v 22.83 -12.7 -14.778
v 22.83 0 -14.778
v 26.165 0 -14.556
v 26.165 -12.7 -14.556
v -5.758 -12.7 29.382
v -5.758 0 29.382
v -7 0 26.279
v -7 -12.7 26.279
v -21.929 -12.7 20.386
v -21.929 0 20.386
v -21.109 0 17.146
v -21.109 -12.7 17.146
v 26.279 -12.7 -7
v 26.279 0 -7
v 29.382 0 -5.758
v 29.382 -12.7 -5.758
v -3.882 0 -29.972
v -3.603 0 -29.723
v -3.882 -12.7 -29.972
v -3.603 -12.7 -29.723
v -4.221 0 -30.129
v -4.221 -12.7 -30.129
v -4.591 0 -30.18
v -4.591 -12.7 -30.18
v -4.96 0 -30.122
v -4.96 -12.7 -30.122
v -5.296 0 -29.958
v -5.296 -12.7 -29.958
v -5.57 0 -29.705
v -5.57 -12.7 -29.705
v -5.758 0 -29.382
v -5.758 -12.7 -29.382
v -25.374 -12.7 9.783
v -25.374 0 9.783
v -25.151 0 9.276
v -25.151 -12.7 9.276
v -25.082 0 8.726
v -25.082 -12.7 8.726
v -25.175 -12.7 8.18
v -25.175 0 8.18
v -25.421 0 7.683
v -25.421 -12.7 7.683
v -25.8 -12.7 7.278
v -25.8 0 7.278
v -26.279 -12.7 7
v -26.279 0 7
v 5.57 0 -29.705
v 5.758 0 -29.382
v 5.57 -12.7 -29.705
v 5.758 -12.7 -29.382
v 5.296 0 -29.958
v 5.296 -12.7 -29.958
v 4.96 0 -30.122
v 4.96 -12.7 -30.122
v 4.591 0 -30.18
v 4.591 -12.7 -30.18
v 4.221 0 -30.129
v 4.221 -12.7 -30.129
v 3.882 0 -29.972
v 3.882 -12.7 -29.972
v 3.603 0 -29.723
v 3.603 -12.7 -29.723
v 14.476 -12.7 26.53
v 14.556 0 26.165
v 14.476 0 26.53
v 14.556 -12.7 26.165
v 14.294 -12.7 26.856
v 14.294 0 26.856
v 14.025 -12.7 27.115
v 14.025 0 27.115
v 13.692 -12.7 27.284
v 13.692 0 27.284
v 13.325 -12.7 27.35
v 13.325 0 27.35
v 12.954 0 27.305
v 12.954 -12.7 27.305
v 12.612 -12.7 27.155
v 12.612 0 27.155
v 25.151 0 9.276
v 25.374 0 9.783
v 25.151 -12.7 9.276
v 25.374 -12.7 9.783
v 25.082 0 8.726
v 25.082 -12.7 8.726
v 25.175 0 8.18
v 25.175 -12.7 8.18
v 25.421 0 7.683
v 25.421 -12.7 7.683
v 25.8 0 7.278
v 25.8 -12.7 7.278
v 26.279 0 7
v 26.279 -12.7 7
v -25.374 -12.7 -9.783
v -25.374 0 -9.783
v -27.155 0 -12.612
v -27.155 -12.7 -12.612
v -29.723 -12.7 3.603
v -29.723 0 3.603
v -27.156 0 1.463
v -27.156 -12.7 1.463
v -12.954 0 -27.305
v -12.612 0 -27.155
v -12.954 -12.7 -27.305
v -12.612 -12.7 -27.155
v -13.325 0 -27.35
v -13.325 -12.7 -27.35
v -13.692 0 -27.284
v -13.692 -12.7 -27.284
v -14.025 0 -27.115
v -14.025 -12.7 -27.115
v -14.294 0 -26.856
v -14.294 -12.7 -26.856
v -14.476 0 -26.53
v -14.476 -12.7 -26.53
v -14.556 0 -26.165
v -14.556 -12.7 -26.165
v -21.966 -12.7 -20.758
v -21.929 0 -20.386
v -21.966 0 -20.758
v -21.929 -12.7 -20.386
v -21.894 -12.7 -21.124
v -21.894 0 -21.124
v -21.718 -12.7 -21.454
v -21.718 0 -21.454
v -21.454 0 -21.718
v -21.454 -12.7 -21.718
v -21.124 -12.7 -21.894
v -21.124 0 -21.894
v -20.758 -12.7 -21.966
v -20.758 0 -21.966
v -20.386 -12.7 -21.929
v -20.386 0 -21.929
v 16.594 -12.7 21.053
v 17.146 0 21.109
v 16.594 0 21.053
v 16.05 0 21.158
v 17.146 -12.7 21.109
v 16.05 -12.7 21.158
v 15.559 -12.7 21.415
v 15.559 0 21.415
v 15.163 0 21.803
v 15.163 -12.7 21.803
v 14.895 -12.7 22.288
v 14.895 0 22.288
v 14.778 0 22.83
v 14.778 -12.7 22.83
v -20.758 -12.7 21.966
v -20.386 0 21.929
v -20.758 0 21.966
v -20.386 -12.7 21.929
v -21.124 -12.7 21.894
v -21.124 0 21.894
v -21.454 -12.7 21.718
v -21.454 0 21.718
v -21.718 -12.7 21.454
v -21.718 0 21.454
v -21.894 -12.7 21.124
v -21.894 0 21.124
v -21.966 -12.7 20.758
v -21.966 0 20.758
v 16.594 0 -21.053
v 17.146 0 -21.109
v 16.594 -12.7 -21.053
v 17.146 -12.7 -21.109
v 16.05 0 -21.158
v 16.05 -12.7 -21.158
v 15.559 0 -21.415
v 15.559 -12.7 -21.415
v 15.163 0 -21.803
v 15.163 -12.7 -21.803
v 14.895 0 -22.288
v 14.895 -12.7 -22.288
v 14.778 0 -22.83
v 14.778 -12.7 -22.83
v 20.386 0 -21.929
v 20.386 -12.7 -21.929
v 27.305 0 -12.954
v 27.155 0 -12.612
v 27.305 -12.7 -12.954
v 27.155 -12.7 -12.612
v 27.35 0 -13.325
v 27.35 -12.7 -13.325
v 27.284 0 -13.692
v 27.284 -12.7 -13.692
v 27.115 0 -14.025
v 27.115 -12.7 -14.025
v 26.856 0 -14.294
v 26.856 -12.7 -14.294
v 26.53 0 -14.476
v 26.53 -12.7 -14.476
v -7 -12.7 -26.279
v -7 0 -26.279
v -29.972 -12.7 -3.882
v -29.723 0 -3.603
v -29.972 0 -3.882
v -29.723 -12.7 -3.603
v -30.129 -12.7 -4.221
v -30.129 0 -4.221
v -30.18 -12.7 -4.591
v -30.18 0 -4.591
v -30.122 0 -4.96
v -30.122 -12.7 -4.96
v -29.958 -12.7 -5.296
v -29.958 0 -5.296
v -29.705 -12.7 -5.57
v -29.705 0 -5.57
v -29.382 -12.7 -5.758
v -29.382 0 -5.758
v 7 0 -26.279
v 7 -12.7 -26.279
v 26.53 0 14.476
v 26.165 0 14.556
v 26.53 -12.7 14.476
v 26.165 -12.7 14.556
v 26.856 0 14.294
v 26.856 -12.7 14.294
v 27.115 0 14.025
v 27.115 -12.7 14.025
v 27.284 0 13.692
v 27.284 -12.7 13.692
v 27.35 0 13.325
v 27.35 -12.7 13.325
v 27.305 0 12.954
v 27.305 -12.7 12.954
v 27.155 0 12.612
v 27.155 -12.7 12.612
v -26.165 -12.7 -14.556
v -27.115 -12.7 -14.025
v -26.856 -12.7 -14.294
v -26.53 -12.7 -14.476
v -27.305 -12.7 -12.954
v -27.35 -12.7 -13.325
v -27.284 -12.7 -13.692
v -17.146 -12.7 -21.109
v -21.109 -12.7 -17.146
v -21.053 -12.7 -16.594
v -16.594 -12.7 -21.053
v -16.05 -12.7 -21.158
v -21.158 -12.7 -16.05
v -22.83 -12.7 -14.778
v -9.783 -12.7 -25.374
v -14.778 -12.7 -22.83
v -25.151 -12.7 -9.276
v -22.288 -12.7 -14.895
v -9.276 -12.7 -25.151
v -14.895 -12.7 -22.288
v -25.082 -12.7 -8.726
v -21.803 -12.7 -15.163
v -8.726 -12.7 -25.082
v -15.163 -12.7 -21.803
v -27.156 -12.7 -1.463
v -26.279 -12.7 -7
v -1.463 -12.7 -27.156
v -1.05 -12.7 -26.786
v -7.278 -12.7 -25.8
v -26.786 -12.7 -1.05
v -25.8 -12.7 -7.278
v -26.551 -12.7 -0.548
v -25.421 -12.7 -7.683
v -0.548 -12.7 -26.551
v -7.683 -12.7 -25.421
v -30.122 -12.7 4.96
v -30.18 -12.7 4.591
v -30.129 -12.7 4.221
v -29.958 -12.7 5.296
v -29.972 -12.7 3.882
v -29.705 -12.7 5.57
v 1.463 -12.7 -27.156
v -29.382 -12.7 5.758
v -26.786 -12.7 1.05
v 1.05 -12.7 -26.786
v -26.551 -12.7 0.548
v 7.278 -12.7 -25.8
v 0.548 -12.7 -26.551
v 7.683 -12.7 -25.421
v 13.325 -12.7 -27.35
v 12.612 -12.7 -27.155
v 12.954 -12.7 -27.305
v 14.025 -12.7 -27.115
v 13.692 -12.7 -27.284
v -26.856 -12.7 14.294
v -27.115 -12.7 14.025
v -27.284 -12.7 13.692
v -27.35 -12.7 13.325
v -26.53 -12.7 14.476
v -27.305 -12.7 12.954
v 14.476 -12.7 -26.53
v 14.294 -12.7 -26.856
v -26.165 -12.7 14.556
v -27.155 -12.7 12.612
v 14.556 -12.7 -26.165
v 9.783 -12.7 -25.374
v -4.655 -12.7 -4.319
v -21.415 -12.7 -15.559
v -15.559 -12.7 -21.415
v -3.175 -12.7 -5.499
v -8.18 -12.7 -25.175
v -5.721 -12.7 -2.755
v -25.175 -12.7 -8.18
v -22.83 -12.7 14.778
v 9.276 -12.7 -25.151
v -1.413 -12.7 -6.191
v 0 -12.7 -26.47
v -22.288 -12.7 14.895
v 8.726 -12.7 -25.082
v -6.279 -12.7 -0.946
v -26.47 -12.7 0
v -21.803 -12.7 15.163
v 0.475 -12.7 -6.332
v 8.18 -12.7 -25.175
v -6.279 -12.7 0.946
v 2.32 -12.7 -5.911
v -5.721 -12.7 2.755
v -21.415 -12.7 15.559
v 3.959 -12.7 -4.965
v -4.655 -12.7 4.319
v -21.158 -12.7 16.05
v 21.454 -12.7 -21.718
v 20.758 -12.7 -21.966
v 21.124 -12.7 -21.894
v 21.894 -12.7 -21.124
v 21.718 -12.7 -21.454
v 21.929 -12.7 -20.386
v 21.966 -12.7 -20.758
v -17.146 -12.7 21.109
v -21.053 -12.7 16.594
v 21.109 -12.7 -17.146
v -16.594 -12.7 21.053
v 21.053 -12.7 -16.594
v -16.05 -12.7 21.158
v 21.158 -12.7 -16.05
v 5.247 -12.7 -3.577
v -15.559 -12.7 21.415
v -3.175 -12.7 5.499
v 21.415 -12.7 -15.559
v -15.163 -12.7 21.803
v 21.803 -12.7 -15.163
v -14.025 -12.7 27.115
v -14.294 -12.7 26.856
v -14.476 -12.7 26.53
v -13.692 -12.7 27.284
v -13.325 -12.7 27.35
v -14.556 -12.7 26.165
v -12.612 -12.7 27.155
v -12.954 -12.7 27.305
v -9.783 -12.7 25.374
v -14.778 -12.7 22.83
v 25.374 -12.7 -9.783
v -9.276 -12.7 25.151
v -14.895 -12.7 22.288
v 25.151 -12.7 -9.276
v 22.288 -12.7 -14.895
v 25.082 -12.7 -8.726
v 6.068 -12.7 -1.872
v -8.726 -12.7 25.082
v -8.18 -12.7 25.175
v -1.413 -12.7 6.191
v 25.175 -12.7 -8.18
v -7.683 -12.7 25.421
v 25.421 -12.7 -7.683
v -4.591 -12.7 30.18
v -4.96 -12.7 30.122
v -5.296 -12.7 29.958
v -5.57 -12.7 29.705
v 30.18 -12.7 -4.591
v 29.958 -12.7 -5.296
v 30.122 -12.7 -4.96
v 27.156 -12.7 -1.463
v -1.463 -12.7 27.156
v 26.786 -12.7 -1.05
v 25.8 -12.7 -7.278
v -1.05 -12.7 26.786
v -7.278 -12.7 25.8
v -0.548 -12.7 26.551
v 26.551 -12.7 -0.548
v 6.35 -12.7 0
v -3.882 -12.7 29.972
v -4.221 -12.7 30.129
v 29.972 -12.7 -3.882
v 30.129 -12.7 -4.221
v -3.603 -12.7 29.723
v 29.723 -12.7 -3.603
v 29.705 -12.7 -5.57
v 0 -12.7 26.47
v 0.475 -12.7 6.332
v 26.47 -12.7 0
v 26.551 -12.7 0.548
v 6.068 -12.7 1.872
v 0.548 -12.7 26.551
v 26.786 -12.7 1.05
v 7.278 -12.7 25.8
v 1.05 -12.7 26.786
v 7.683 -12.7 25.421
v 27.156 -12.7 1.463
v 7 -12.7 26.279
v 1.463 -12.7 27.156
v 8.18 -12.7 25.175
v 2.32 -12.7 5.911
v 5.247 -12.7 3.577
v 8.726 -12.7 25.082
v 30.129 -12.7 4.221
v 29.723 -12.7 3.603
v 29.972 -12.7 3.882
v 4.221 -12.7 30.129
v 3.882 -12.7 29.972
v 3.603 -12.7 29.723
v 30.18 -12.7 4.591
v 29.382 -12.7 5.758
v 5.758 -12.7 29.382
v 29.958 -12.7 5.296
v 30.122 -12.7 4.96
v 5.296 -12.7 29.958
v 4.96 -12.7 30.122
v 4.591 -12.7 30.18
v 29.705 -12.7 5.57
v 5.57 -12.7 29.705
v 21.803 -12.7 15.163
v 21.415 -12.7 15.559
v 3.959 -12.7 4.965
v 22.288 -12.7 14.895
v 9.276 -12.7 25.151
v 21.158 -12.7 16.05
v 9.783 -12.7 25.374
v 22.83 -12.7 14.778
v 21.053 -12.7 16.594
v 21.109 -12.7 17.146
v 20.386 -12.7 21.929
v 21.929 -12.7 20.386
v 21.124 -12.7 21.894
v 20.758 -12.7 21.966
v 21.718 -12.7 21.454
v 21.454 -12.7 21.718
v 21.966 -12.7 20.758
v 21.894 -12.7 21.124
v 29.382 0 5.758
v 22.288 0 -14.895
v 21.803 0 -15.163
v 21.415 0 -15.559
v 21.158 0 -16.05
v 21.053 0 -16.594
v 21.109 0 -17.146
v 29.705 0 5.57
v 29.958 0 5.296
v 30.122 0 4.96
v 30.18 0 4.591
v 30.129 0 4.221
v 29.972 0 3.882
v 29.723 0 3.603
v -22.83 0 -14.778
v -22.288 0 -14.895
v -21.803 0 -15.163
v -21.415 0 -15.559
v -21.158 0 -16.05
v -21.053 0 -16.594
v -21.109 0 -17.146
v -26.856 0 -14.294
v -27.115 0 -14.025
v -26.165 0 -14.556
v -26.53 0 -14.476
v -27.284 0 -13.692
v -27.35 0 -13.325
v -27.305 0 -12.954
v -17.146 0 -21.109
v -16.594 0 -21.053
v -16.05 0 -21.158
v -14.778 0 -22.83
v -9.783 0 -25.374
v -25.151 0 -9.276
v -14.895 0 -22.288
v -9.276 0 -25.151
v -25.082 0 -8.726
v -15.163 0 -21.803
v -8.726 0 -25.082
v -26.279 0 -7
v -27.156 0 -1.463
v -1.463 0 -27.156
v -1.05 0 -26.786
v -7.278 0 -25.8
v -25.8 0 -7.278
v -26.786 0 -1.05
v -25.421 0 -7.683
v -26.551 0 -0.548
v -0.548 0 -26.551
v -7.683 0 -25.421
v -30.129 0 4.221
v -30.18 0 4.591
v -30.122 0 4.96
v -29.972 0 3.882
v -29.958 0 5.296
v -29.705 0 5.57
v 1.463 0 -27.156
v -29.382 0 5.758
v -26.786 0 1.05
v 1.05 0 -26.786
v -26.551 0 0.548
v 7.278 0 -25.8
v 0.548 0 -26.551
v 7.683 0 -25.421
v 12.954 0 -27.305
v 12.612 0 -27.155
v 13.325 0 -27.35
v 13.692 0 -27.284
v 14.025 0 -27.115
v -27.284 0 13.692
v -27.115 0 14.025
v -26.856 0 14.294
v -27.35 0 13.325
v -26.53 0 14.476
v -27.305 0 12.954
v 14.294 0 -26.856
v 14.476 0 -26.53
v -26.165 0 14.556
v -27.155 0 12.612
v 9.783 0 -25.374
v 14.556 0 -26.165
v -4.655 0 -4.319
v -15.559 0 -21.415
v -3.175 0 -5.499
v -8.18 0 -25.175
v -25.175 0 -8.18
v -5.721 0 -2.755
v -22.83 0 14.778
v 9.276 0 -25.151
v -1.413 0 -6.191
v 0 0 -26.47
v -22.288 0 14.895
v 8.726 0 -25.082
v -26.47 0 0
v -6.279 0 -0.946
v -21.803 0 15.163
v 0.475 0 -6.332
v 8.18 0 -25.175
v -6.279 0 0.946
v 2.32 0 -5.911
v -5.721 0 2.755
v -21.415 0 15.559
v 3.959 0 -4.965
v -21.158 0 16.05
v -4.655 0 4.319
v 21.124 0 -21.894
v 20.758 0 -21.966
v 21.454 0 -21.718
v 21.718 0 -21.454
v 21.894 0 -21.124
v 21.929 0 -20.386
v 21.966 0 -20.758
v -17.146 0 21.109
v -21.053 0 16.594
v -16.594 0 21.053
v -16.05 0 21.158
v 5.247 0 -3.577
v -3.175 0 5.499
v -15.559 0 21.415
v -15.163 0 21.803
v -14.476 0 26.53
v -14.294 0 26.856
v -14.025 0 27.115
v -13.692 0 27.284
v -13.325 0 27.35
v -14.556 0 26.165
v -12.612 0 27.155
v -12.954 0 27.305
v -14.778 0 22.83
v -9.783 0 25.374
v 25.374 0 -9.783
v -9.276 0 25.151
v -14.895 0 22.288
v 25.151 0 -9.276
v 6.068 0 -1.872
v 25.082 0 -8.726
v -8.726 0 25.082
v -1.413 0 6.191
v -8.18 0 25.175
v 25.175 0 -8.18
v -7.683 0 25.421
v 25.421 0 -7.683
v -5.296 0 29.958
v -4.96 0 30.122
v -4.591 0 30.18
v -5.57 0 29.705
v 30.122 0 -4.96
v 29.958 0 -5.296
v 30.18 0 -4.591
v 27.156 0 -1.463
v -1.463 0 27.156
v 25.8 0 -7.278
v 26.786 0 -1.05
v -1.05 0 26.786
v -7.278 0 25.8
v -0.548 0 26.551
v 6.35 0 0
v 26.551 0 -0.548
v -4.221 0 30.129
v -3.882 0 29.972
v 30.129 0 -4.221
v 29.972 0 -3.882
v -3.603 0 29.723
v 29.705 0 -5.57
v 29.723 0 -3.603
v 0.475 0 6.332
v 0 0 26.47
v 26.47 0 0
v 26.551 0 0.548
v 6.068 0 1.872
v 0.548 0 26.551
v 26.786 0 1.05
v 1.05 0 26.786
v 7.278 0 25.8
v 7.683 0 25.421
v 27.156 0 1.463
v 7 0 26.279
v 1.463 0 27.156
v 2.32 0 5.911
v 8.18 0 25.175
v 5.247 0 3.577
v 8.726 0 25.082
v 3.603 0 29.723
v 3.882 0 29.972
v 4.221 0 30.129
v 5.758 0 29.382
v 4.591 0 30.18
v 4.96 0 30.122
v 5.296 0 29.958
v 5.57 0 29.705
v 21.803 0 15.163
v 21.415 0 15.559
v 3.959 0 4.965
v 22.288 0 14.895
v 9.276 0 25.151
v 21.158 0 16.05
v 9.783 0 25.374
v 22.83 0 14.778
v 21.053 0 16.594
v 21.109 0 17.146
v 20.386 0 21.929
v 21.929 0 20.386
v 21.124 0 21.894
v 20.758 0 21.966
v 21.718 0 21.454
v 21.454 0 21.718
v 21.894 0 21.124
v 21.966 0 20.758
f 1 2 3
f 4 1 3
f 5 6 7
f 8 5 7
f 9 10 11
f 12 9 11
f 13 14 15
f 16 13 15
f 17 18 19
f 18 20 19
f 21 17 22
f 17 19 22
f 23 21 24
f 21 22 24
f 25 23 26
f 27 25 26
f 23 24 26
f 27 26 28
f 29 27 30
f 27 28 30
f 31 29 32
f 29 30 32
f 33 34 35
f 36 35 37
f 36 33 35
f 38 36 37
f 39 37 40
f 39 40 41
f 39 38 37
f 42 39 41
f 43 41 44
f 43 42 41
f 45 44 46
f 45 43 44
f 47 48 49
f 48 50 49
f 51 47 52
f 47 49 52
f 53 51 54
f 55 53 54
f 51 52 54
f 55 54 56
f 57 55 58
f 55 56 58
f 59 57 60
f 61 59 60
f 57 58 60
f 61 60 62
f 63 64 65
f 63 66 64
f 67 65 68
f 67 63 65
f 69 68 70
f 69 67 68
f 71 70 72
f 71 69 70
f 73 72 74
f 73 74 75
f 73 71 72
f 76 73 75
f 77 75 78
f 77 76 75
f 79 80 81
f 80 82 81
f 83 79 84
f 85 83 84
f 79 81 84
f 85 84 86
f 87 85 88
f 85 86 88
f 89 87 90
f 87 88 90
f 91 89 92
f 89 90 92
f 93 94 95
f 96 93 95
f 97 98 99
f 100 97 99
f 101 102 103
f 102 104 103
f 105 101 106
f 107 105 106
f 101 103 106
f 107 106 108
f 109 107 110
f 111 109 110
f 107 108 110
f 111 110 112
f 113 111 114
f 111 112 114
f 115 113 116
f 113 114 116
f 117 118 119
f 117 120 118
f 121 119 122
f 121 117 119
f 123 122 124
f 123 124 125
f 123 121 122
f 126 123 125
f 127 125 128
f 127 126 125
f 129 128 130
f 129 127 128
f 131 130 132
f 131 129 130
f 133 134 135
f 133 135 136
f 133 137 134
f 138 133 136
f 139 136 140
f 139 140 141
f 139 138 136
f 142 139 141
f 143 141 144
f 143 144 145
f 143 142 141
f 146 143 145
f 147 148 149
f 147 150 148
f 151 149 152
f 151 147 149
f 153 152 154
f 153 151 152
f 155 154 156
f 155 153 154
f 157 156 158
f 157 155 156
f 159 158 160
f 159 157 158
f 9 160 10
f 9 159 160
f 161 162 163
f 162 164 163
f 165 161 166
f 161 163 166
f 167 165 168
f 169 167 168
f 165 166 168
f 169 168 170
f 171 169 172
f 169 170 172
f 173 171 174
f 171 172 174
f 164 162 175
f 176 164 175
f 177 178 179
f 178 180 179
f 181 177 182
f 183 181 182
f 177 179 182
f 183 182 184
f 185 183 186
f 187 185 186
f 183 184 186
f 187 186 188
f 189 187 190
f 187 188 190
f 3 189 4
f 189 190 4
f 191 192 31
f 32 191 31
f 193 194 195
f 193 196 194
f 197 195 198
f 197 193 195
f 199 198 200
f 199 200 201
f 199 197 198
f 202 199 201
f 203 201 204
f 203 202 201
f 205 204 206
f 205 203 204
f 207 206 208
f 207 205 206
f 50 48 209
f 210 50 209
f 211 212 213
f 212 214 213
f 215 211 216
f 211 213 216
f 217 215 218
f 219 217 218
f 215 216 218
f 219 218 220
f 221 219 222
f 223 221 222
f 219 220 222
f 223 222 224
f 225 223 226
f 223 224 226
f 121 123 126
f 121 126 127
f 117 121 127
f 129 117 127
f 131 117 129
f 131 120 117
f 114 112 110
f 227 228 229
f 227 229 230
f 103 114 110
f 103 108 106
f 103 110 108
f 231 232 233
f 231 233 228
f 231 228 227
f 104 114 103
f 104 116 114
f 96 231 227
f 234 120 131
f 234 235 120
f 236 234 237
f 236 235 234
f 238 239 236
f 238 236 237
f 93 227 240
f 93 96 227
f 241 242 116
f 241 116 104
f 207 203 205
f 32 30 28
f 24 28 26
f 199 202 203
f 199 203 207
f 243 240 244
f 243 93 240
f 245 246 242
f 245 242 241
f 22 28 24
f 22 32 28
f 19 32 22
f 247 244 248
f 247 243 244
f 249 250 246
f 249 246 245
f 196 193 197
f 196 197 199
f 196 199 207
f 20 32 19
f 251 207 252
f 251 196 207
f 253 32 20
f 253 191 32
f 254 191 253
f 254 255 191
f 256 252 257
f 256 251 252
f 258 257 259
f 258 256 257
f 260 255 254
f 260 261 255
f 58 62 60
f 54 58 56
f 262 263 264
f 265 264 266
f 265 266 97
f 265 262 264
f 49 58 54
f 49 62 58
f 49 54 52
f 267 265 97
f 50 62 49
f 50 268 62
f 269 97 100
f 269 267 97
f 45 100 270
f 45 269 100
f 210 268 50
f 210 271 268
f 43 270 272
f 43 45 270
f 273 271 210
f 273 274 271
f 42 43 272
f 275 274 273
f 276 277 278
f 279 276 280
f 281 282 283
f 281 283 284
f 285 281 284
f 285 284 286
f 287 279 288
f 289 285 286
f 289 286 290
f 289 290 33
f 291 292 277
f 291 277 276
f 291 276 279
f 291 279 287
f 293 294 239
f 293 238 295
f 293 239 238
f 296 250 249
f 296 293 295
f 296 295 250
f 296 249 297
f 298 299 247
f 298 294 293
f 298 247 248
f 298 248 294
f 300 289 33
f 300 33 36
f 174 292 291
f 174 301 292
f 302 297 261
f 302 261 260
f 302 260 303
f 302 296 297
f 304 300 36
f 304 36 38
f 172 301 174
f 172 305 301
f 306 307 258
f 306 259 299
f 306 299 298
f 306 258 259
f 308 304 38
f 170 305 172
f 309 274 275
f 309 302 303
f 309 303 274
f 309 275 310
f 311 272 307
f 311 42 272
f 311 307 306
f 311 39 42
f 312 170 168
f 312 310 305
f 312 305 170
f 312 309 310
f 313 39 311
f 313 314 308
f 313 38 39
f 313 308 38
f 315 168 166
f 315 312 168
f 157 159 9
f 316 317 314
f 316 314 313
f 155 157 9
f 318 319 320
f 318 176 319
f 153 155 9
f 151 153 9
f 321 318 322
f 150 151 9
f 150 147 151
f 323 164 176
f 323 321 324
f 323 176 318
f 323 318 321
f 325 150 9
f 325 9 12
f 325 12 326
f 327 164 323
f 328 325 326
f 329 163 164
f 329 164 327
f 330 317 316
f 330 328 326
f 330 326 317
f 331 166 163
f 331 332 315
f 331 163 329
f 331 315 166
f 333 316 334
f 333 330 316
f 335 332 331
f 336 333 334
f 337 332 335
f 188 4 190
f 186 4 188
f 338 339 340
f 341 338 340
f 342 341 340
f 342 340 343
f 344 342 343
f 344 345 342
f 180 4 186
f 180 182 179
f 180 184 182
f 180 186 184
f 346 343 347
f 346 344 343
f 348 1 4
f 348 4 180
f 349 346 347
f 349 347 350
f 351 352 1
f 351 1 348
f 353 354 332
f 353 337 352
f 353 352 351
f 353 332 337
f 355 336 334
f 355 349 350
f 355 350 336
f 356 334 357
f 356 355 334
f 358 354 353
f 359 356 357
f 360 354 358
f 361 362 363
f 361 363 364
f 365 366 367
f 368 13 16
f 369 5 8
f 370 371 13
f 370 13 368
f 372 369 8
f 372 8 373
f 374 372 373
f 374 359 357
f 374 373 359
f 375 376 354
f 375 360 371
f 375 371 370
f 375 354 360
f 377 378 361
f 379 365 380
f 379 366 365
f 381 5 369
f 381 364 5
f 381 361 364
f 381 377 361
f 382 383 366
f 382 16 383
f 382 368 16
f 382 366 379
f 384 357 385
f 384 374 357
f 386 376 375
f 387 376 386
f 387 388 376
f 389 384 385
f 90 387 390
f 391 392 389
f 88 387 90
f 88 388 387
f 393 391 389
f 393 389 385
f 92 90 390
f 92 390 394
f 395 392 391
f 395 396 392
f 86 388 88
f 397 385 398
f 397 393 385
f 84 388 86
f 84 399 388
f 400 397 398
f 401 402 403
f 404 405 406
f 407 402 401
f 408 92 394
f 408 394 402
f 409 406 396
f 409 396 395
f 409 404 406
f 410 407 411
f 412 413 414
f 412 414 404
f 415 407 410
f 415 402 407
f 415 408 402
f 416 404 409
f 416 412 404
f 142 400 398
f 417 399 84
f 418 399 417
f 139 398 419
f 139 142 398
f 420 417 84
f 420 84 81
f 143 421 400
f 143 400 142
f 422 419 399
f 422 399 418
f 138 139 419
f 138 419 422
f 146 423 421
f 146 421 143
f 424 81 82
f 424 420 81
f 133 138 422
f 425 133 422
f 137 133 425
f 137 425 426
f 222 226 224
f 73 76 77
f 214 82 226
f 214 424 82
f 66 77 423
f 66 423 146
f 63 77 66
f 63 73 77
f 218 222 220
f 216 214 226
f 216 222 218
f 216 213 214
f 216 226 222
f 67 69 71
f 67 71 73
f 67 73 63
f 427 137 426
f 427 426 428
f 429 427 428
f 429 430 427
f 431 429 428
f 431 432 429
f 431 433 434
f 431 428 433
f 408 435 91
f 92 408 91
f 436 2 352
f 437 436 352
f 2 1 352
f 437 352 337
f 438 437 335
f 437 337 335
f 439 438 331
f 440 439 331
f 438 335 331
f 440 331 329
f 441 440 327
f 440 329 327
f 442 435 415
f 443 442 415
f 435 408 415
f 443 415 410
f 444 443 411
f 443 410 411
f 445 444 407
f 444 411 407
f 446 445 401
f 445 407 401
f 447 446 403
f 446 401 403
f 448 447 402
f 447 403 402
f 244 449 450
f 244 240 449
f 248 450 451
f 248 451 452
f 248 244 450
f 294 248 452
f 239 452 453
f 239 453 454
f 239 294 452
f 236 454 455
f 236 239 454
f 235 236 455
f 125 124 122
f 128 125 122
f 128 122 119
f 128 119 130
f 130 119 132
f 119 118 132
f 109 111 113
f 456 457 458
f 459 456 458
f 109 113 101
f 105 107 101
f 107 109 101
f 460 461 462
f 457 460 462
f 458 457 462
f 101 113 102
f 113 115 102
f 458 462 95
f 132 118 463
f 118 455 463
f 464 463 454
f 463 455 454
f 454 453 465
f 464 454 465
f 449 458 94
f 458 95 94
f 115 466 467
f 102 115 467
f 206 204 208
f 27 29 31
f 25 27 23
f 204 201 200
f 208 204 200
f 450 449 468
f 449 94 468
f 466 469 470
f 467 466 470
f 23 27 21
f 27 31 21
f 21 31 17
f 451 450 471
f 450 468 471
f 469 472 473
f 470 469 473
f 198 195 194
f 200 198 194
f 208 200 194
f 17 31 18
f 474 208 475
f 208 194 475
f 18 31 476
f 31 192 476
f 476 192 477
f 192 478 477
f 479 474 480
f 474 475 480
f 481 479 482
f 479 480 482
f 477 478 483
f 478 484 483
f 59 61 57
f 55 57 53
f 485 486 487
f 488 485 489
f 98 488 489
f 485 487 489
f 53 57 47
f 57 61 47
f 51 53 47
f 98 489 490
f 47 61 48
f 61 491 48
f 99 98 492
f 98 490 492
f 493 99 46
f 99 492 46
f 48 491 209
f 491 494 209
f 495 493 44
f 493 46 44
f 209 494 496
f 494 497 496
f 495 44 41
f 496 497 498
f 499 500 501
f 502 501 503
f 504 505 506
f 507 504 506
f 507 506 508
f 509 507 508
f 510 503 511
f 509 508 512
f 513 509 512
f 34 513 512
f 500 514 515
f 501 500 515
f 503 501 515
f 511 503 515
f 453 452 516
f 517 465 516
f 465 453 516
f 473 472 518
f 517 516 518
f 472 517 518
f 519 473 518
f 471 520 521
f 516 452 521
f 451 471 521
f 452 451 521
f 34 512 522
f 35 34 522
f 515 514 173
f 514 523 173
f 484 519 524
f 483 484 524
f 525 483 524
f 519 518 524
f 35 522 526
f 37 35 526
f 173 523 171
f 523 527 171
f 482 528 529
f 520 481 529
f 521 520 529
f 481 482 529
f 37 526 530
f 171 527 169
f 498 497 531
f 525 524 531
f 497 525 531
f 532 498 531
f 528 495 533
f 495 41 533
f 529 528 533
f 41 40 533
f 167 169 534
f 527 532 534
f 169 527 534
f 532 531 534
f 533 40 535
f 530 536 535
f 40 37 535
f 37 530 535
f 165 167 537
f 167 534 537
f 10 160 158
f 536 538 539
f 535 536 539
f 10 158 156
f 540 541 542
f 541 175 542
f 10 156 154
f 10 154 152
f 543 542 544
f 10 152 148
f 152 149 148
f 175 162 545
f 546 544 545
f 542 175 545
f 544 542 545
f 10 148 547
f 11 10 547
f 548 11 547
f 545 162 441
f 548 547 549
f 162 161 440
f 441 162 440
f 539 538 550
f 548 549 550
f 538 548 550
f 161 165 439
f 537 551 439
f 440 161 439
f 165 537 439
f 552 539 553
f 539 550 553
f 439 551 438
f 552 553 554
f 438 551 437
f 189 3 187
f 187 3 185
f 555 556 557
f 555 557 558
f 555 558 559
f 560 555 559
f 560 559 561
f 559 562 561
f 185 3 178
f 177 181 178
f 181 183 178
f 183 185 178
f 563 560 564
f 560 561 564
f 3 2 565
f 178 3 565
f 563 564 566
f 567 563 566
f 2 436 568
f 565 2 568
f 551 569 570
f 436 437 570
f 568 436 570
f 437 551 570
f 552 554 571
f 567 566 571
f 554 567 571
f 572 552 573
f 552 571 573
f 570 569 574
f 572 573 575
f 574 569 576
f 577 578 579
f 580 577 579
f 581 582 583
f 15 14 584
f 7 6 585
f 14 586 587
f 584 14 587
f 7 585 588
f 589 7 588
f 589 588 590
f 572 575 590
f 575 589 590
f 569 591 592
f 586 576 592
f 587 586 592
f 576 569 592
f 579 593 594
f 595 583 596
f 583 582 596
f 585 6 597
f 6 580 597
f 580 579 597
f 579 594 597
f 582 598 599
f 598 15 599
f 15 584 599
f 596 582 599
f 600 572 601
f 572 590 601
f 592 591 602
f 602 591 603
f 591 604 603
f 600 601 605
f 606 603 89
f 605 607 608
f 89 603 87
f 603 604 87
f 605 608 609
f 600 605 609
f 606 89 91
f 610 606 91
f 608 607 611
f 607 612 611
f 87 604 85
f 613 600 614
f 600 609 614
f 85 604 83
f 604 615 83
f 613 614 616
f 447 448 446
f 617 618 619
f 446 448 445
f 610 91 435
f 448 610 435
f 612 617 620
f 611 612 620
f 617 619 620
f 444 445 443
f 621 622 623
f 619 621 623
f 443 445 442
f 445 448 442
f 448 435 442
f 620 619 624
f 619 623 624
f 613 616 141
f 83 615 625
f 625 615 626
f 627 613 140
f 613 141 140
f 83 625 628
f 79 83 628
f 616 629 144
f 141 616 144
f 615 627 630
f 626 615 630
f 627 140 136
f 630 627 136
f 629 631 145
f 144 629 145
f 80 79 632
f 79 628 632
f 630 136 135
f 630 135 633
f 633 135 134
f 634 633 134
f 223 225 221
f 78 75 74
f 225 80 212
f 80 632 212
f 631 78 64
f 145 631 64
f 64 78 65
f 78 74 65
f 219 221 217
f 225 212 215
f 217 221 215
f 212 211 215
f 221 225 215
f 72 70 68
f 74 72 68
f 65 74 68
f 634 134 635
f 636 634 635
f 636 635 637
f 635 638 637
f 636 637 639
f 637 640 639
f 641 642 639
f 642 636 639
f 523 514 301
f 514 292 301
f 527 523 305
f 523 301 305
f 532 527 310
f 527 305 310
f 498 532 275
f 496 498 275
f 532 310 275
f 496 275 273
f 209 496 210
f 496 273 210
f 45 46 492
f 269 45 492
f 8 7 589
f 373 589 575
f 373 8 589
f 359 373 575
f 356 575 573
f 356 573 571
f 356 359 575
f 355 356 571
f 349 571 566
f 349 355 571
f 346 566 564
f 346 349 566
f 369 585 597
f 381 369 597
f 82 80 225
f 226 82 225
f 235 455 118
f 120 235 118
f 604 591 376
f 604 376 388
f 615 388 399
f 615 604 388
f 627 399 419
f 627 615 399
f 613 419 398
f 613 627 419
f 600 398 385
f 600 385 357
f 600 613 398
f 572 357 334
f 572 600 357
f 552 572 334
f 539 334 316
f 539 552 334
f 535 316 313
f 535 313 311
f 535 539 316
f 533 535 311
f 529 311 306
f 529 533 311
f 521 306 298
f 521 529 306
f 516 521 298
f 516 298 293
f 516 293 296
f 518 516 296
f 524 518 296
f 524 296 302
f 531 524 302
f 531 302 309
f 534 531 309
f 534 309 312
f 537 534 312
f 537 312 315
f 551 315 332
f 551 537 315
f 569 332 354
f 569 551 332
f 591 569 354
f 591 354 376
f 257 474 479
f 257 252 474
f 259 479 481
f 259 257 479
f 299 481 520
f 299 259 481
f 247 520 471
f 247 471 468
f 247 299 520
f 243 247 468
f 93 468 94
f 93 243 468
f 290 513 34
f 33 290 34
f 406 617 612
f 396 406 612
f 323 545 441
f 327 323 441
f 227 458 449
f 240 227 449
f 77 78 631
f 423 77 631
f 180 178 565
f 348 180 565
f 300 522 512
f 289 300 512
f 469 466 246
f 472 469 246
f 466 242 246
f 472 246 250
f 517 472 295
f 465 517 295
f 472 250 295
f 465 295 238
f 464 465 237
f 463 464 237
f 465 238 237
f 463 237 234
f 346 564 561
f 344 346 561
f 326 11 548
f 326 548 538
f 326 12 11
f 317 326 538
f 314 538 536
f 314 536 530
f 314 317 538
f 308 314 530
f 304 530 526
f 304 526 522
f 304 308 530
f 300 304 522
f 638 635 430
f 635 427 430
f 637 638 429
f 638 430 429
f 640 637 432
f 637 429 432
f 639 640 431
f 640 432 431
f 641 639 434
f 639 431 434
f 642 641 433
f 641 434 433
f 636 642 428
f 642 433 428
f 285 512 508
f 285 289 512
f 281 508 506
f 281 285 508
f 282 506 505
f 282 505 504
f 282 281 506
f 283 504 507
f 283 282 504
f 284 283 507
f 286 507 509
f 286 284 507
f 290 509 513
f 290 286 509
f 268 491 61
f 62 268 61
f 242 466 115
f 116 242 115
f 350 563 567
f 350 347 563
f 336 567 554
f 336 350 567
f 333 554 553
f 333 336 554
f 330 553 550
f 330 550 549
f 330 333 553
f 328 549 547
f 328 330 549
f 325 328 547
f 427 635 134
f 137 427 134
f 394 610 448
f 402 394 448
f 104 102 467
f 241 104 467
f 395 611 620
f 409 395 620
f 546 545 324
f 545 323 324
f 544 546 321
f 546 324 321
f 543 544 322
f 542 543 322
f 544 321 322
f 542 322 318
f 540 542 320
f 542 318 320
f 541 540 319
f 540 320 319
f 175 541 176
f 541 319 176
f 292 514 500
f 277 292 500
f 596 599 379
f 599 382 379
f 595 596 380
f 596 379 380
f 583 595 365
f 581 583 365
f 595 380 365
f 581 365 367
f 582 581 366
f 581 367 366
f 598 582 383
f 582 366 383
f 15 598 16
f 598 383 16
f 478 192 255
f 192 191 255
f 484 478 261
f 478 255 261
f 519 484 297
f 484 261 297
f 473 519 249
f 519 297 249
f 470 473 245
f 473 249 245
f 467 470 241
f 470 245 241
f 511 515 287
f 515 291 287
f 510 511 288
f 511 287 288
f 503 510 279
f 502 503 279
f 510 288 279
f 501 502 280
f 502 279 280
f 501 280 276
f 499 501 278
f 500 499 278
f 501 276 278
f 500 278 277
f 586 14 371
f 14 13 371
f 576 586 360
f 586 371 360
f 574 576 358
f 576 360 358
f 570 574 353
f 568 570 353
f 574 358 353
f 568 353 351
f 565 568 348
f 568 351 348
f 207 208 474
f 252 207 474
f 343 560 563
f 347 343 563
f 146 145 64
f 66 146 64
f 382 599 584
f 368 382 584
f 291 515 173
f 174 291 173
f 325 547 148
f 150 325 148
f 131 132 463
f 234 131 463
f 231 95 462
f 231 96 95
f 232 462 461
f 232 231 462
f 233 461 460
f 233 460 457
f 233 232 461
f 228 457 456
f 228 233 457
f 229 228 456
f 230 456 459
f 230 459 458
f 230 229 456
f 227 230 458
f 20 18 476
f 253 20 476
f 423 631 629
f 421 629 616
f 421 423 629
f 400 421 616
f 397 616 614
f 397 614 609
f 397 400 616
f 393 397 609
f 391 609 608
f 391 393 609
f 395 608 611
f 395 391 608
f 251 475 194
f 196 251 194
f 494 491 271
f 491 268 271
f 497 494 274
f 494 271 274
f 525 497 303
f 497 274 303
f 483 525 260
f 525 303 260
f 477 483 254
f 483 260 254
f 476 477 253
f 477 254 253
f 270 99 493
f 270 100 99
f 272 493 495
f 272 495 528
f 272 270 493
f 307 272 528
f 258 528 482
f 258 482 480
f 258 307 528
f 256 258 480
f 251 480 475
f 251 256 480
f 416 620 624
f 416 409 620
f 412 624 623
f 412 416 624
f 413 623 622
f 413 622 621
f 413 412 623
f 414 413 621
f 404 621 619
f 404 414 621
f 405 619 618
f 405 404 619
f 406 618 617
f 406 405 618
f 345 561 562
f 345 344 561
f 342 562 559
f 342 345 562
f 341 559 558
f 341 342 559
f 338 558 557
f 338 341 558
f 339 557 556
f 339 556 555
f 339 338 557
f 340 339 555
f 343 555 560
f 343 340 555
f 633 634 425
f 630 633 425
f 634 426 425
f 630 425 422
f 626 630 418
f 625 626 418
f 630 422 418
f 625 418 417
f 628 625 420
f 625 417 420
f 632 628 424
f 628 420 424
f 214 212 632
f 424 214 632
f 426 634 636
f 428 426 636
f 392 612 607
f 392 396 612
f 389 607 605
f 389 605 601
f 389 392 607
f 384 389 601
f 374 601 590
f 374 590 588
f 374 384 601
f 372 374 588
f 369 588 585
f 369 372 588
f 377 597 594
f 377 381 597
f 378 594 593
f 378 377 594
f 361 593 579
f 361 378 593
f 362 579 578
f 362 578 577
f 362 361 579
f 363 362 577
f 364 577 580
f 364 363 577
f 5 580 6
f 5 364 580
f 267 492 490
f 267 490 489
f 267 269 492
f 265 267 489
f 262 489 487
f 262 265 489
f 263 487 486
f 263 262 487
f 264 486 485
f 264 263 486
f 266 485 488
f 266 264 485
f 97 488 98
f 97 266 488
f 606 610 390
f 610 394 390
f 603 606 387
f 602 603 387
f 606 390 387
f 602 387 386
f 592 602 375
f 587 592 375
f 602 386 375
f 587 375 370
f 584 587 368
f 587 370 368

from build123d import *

# Parameters (mm, degrees)
F0_R     = 6.35
F1_DEPTH = 12.7
F2_R     = 1.905
F3_R     = 1.27


with BuildPart() as f1:
    # F0 (on Front) → F1 (new body)
    with BuildSketch(Plane.XZ):
        Polygon((22.45064, 22.45064), (14.929745, 20.549032), (14.414198, 28.289457), (7.849032, 24.156836), (4.966794, 31.359105), (0, 25.4), (-4.966794, 31.359105), (-7.849032, 24.156836), (-14.414198, 28.289457), (-14.929745, 20.549032), (-22.45064, 22.45064), (-20.549032, 14.929745), (-28.289457, 14.414198), (-24.156836, 7.849032), (-31.359105, 4.966794), (-25.4, 0), (-31.359105, -4.966794), (-24.156836, -7.849032), (-28.289457, -14.414198), (-20.549032, -14.929745), (-22.45064, -22.45064), (-14.929745, -20.549032), (-14.414198, -28.289457), (-7.849032, -24.156836), (-4.966794, -31.359105), (0, -25.4), (4.966794, -31.359105), (7.849032, -24.156836), (14.414198, -28.289457), (14.929745, -20.549032), (22.45064, -22.45064), (20.549032, -14.929745), (28.289457, -14.414198), (24.156836, -7.849032), (31.359105, -4.966794), (25.4, 0), (31.359105, 4.966794), (24.156836, 7.849032), (28.289457, 14.414198), (20.549032, 14.929745), align=None)
        Circle(F0_R, mode=Mode.SUBTRACT)
    extrude(amount=F1_DEPTH)

    # F2
    f2_edges = [f1.edges().sort_by_distance(p)[0] for p in [
        (-20.549032, -6.35, 14.929745),
        (-14.929745, -6.35, 20.549032),
        (-24.156836, -6.35, 7.849032),
        (-25.4, -6.35, 0),
        (-24.156836, -6.35, -7.849032),
        (-20.549032, -6.35, -14.929745),
        (-14.929745, -6.35, -20.549032),
        (-7.849032, -6.35, -24.156836),
        (0, -6.35, -25.4),
        (7.849032, -6.35, -24.156836),
        (14.929745, -6.35, -20.549032),
        (20.549032, -6.35, -14.929745),
        (24.156836, -6.35, -7.849032),
        (25.4, -6.35, 0),
        (24.156836, -6.35, 7.849032),
        (20.549032, -6.35, 14.929745),
        (14.929745, -6.35, 20.549032),
        (7.849032, -6.35, 24.156836),
        (0, -6.35, 25.4),
        (-7.849032, -6.35, 24.156836),
    ]]
    fillet(f2_edges, radius=F2_R)

    # F3
    f3_edges = [f1.edges().sort_by_distance(p)[0] for p in [
        (28.289457, -6.35, -14.414198),
        (22.45064, -6.35, -22.45064),
        (14.414198, -6.35, -28.289457),
        (4.966794, -6.35, -31.359105),
        (-14.414198, -6.35, -28.289457),
        (-4.966794, -6.35, -31.359105),
        (-22.45064, -6.35, -22.45064),
        (-28.289457, -6.35, -14.414198),
        (-31.359105, -6.35, -4.966794),
        (-31.359105, -6.35, 4.966794),
        (-14.414198, -6.35, 28.289457),
        (-4.966794, -6.35, 31.359105),
        (-28.289457, -6.35, 14.414198),
        (-22.45064, -6.35, 22.45064),
        (4.966794, -6.35, 31.359105),
        (14.414198, -6.35, 28.289457),
        (22.45064, -6.35, 22.45064),
        (28.289457, -6.35, 14.414198),
        (31.359105, -6.35, 4.966794),
        (31.359105, -6.35, -4.966794),
    ]]
    fillet(f3_edges, radius=F3_R)


solid = f1.part
